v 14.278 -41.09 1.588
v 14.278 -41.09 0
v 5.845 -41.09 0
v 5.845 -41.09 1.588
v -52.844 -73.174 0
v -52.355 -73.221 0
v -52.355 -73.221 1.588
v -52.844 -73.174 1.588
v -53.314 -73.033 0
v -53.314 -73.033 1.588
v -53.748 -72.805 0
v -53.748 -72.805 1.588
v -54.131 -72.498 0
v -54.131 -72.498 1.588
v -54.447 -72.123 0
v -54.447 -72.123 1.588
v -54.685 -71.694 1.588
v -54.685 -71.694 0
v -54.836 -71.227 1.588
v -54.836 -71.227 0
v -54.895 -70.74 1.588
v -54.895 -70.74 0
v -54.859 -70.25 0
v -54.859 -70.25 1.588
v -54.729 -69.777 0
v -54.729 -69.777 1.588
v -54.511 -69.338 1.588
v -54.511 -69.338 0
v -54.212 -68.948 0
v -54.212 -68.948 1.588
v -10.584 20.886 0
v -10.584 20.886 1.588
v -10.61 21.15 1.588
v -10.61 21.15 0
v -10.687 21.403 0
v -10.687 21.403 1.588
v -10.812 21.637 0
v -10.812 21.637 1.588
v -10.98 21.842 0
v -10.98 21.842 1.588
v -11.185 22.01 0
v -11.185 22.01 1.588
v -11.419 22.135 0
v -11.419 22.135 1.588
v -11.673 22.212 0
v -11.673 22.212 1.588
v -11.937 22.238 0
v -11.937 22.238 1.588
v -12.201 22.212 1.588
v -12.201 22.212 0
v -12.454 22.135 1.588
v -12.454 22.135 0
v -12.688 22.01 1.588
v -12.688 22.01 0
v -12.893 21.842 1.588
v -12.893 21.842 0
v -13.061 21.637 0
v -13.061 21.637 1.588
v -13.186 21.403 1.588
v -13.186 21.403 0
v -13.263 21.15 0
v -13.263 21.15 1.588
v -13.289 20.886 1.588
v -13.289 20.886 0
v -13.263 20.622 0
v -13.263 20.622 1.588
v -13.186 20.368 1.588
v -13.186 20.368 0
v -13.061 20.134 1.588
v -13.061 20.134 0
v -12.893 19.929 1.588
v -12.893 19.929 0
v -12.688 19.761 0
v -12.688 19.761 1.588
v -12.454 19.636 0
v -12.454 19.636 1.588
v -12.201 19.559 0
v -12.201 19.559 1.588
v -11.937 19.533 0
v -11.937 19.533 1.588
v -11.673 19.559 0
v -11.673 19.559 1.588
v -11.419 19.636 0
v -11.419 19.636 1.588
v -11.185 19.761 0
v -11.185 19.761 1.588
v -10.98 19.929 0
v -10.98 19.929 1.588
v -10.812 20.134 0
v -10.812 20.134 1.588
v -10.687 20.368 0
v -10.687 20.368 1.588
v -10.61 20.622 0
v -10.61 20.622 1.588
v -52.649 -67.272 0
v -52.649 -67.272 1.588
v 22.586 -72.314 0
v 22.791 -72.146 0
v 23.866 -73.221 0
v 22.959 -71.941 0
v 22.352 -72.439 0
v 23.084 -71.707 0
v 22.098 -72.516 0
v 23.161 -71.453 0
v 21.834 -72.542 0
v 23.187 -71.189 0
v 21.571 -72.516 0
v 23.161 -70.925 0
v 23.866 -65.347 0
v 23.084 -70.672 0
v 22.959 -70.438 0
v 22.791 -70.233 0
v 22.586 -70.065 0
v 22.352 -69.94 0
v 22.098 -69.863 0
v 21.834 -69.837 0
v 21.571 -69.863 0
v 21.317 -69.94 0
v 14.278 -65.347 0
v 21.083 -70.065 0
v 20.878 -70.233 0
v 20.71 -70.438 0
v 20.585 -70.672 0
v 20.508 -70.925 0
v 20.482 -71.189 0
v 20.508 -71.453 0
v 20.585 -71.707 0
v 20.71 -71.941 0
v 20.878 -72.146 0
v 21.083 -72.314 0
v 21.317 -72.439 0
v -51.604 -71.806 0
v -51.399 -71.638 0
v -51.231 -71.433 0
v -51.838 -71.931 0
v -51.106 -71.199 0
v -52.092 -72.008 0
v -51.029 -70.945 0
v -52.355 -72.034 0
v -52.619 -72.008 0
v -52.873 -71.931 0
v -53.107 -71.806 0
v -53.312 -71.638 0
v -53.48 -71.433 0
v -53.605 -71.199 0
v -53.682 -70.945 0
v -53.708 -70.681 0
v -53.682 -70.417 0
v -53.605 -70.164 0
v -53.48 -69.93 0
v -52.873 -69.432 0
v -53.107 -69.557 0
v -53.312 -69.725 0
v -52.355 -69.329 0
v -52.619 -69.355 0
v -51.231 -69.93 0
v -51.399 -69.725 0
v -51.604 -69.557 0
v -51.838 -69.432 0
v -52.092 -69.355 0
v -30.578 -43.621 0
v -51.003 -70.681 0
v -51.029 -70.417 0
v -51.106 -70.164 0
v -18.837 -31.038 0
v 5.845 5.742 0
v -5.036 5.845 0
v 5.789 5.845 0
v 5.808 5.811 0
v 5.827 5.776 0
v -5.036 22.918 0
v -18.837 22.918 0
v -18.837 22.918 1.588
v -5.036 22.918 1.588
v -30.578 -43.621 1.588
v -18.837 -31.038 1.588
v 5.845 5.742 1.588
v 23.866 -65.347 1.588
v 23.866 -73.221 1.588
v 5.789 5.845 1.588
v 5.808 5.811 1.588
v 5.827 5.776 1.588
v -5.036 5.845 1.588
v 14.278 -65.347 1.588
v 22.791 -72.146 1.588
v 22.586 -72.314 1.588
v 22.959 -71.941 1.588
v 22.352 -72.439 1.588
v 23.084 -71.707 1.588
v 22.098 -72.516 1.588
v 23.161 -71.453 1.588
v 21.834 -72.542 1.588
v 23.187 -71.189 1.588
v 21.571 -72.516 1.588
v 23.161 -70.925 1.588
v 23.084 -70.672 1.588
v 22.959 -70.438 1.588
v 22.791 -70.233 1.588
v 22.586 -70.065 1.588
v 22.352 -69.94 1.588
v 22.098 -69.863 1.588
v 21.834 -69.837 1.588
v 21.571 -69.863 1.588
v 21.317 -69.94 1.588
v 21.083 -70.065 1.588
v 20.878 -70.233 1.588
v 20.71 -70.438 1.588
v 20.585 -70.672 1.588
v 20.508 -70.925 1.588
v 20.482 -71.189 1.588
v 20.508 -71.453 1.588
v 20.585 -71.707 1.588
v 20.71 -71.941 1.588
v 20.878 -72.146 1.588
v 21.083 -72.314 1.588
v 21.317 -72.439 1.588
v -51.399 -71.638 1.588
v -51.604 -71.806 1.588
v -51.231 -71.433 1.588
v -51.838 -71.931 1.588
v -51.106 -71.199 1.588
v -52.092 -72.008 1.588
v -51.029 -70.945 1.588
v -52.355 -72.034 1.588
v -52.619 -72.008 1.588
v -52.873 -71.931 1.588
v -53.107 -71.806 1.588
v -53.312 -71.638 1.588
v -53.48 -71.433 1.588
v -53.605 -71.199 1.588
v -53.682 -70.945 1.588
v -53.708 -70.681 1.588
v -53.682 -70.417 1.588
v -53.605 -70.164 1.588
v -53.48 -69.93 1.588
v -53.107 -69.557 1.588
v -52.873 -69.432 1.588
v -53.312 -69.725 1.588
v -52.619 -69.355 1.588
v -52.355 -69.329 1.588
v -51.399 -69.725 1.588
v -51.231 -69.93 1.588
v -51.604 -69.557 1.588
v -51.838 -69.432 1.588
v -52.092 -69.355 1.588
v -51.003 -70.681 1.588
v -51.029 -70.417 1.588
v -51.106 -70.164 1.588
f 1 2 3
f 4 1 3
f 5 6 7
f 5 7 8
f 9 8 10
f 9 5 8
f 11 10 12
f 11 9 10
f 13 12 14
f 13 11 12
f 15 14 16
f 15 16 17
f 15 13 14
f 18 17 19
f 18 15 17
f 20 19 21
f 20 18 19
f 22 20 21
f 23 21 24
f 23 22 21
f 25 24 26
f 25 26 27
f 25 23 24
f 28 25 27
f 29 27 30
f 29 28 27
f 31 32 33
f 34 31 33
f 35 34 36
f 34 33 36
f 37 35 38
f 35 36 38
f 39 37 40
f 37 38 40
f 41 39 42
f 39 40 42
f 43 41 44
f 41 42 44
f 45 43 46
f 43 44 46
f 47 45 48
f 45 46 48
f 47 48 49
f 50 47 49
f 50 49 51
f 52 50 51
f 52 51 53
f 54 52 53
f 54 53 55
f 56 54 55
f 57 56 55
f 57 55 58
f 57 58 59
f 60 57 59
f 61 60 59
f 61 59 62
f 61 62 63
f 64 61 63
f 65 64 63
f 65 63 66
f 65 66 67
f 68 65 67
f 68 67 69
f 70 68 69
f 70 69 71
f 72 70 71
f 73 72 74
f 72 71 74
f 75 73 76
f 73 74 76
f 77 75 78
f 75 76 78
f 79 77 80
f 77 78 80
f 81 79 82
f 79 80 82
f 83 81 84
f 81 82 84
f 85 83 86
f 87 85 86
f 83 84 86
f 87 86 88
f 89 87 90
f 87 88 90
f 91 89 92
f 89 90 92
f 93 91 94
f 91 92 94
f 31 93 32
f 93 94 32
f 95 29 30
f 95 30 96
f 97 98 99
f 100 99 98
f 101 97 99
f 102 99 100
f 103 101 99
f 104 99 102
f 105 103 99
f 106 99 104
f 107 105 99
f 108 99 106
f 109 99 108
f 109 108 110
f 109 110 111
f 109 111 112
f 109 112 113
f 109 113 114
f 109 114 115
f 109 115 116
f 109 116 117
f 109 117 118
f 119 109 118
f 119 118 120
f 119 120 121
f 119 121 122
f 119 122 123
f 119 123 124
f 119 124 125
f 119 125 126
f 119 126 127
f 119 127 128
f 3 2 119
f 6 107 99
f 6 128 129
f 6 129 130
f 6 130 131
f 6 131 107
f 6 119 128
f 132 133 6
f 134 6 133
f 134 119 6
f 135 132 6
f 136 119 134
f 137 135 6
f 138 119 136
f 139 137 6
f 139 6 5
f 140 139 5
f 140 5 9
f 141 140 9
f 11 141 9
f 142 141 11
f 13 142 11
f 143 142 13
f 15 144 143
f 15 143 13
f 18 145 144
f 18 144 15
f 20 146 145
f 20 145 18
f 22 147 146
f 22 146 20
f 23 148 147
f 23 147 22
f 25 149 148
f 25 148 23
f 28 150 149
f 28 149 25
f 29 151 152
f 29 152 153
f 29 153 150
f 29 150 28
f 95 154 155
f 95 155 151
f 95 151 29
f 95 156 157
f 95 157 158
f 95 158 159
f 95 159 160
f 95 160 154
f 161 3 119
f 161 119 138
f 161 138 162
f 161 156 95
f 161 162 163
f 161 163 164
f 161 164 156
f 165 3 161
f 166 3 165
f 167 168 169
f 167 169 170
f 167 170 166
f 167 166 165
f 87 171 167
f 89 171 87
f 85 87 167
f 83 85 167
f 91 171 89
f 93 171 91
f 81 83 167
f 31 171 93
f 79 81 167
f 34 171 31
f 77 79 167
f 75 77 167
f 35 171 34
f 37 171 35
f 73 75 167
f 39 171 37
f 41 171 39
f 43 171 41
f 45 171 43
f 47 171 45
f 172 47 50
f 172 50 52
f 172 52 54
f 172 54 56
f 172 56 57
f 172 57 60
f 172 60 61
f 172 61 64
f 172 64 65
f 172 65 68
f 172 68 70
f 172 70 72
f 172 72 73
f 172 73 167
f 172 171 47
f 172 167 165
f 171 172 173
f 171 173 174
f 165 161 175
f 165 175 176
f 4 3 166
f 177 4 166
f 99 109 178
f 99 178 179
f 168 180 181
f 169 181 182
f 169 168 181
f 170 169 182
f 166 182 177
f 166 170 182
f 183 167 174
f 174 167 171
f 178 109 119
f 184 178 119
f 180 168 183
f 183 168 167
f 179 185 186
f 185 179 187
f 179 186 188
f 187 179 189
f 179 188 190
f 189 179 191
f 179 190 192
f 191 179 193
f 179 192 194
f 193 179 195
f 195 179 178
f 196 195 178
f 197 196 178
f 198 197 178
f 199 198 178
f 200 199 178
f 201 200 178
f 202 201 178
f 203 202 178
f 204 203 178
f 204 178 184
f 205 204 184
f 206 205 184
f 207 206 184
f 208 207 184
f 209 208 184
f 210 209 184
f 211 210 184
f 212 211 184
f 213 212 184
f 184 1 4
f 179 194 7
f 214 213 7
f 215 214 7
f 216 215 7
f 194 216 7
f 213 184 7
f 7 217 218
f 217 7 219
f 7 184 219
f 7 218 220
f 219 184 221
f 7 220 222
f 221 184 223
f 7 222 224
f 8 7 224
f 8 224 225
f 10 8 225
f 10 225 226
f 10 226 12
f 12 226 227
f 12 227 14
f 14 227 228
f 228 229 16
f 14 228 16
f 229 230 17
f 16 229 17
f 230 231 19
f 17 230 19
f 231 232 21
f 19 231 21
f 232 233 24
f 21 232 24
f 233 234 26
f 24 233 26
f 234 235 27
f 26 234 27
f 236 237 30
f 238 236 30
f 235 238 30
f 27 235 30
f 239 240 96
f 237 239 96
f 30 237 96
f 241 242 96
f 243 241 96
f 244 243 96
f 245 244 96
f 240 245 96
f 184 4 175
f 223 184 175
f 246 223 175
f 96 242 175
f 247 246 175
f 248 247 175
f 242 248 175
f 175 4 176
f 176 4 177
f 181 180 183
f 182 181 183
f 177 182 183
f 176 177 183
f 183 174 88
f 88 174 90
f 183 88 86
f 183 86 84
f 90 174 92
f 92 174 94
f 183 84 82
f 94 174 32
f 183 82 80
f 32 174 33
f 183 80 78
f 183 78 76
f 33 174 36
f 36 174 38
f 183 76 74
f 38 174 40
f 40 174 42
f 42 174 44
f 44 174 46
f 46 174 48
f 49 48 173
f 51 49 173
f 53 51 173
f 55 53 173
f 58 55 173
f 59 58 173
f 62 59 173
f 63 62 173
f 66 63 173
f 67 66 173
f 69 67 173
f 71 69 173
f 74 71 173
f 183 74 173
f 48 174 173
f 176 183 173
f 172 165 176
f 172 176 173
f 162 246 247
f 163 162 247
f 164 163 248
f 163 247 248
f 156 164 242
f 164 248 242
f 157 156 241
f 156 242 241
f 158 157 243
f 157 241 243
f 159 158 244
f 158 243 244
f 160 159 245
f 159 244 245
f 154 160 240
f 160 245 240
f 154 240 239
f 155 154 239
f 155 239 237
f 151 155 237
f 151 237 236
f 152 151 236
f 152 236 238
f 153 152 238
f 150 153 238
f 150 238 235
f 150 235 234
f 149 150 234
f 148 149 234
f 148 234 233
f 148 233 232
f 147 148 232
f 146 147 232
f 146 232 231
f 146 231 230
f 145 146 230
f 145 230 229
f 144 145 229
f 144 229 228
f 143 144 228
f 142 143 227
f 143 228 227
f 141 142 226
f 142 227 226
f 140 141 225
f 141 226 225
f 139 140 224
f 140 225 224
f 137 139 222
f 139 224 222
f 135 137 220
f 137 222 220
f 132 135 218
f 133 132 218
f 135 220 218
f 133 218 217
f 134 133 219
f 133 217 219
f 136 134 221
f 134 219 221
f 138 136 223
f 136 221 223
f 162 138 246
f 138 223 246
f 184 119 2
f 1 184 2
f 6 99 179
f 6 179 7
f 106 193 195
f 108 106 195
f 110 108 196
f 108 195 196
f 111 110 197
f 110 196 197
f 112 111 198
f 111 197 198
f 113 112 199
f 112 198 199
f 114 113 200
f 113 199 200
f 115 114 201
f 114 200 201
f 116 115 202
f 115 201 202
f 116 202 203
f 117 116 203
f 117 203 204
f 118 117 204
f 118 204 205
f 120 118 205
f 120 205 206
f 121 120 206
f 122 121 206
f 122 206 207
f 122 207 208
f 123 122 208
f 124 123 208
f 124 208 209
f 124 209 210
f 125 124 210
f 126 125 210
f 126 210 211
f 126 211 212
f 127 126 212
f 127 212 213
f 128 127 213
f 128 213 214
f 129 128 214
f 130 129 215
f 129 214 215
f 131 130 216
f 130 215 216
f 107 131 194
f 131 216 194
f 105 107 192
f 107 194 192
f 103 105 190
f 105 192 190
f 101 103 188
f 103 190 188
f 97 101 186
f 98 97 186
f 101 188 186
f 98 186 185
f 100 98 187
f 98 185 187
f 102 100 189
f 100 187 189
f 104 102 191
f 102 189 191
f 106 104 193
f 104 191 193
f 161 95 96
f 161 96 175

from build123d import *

# Parameters (mm, degrees)
BOSS_EXTRUDE1_DEPTH   = 1.5875
F_2_CLEARANCE_HOLE1_D = 2.7051
CUT_EXTRUDE1_DEPTH    = 2.5875


with BuildPart() as part:
    # Sketch1 → Boss-Extrude1 (new body)
    with BuildSketch(Plane.XY):
        with BuildLine():
            Line((-52.648603939, -67.272400153), (-30.578425, -43.620868829))
            Line((-30.578425, -43.620868829), (-18.837275, -31.03845263))
            Line((-18.837275, -31.03845263), (-18.837275, 15.096748243))
            Line((-18.837275, 15.096748243), (-18.837275, 22.917825485))
            Line((-18.837275, 22.917825485), (-5.036497092, 22.917825485))
            ThreePointArc((-5.036497092, 22.917825485), (16.456769026, -18.908795935), (23.866475, -65.347174515))
            Line((23.866475, -65.347174515), (23.866475, -73.221174515))
            Line((23.866475, -73.221174515), (-30.578425, -73.221174515))
            Line((-30.578425, -73.221174515), (-52.355372399, -73.221174515))
            ThreePointArc((-52.355372399, -73.221174515), (-54.684874047, -71.693608254), (-54.212432291, -68.948278512))
            Line((-54.212432291, -68.948278512), (-52.648603939, -67.272400153))
        make_face()
    extrude(amount=BOSS_EXTRUDE1_DEPTH)

    # #2 Clearance Hole1 (through all)
    with Locations(Plane(origin=(0, 0, 0), x_dir=(-1, 0, 0), z_dir=(0, 0, -1))):
        with Locations((-21.834475, -71.189174515), (52.355372399, -70.681174515), (11.936886046, 20.885825485)):
            Hole(F_2_CLEARANCE_HOLE1_D / 2)

    # Sketch4 → Cut-Extrude1 (cut, through all)
    with BuildSketch(Plane(origin=(0, 0, 0), x_dir=(-1, 0, 0), z_dir=(0, 0, -1))):
        with BuildLine():
            ThreePointArc((-21.881749979, -41.090174515), (-23.369466076, -53.178144332), (-23.866475, -65.347174515))
            Line((-23.866475, -65.347174515), (-14.277975, -65.347174515))
            Line((-14.277975, -65.347174515), (-14.277975, -41.090174515))
            Line((-14.277975, -41.090174515), (-21.881749979, -41.090174515))
        make_face()
        with BuildLine():
            ThreePointArc((-5.845175, 5.742133621), (-15.818945129, -17.004413391), (-21.881749979, -41.090174515))
            Line((-21.881749979, -41.090174515), (-14.277975, -41.090174515))
            Line((-14.277975, -41.090174515), (-5.845175, -41.090174515))
            Line((-5.845175, -41.090174515), (-5.845175, 5.742133621))
        make_face()
        with BuildLine():
            ThreePointArc((5.036497092, 22.917825485), (-0.665836205, 14.565033613), (-5.789292349, 5.845175))
            Line((-5.789292349, 5.845175), (5.036497092, 5.845175))
            Line((5.036497092, 5.845175), (5.036497092, 22.917825485))
        make_face()
    extrude(amount=-CUT_EXTRUDE1_DEPTH, mode=Mode.SUBTRACT)


solid = part.part
